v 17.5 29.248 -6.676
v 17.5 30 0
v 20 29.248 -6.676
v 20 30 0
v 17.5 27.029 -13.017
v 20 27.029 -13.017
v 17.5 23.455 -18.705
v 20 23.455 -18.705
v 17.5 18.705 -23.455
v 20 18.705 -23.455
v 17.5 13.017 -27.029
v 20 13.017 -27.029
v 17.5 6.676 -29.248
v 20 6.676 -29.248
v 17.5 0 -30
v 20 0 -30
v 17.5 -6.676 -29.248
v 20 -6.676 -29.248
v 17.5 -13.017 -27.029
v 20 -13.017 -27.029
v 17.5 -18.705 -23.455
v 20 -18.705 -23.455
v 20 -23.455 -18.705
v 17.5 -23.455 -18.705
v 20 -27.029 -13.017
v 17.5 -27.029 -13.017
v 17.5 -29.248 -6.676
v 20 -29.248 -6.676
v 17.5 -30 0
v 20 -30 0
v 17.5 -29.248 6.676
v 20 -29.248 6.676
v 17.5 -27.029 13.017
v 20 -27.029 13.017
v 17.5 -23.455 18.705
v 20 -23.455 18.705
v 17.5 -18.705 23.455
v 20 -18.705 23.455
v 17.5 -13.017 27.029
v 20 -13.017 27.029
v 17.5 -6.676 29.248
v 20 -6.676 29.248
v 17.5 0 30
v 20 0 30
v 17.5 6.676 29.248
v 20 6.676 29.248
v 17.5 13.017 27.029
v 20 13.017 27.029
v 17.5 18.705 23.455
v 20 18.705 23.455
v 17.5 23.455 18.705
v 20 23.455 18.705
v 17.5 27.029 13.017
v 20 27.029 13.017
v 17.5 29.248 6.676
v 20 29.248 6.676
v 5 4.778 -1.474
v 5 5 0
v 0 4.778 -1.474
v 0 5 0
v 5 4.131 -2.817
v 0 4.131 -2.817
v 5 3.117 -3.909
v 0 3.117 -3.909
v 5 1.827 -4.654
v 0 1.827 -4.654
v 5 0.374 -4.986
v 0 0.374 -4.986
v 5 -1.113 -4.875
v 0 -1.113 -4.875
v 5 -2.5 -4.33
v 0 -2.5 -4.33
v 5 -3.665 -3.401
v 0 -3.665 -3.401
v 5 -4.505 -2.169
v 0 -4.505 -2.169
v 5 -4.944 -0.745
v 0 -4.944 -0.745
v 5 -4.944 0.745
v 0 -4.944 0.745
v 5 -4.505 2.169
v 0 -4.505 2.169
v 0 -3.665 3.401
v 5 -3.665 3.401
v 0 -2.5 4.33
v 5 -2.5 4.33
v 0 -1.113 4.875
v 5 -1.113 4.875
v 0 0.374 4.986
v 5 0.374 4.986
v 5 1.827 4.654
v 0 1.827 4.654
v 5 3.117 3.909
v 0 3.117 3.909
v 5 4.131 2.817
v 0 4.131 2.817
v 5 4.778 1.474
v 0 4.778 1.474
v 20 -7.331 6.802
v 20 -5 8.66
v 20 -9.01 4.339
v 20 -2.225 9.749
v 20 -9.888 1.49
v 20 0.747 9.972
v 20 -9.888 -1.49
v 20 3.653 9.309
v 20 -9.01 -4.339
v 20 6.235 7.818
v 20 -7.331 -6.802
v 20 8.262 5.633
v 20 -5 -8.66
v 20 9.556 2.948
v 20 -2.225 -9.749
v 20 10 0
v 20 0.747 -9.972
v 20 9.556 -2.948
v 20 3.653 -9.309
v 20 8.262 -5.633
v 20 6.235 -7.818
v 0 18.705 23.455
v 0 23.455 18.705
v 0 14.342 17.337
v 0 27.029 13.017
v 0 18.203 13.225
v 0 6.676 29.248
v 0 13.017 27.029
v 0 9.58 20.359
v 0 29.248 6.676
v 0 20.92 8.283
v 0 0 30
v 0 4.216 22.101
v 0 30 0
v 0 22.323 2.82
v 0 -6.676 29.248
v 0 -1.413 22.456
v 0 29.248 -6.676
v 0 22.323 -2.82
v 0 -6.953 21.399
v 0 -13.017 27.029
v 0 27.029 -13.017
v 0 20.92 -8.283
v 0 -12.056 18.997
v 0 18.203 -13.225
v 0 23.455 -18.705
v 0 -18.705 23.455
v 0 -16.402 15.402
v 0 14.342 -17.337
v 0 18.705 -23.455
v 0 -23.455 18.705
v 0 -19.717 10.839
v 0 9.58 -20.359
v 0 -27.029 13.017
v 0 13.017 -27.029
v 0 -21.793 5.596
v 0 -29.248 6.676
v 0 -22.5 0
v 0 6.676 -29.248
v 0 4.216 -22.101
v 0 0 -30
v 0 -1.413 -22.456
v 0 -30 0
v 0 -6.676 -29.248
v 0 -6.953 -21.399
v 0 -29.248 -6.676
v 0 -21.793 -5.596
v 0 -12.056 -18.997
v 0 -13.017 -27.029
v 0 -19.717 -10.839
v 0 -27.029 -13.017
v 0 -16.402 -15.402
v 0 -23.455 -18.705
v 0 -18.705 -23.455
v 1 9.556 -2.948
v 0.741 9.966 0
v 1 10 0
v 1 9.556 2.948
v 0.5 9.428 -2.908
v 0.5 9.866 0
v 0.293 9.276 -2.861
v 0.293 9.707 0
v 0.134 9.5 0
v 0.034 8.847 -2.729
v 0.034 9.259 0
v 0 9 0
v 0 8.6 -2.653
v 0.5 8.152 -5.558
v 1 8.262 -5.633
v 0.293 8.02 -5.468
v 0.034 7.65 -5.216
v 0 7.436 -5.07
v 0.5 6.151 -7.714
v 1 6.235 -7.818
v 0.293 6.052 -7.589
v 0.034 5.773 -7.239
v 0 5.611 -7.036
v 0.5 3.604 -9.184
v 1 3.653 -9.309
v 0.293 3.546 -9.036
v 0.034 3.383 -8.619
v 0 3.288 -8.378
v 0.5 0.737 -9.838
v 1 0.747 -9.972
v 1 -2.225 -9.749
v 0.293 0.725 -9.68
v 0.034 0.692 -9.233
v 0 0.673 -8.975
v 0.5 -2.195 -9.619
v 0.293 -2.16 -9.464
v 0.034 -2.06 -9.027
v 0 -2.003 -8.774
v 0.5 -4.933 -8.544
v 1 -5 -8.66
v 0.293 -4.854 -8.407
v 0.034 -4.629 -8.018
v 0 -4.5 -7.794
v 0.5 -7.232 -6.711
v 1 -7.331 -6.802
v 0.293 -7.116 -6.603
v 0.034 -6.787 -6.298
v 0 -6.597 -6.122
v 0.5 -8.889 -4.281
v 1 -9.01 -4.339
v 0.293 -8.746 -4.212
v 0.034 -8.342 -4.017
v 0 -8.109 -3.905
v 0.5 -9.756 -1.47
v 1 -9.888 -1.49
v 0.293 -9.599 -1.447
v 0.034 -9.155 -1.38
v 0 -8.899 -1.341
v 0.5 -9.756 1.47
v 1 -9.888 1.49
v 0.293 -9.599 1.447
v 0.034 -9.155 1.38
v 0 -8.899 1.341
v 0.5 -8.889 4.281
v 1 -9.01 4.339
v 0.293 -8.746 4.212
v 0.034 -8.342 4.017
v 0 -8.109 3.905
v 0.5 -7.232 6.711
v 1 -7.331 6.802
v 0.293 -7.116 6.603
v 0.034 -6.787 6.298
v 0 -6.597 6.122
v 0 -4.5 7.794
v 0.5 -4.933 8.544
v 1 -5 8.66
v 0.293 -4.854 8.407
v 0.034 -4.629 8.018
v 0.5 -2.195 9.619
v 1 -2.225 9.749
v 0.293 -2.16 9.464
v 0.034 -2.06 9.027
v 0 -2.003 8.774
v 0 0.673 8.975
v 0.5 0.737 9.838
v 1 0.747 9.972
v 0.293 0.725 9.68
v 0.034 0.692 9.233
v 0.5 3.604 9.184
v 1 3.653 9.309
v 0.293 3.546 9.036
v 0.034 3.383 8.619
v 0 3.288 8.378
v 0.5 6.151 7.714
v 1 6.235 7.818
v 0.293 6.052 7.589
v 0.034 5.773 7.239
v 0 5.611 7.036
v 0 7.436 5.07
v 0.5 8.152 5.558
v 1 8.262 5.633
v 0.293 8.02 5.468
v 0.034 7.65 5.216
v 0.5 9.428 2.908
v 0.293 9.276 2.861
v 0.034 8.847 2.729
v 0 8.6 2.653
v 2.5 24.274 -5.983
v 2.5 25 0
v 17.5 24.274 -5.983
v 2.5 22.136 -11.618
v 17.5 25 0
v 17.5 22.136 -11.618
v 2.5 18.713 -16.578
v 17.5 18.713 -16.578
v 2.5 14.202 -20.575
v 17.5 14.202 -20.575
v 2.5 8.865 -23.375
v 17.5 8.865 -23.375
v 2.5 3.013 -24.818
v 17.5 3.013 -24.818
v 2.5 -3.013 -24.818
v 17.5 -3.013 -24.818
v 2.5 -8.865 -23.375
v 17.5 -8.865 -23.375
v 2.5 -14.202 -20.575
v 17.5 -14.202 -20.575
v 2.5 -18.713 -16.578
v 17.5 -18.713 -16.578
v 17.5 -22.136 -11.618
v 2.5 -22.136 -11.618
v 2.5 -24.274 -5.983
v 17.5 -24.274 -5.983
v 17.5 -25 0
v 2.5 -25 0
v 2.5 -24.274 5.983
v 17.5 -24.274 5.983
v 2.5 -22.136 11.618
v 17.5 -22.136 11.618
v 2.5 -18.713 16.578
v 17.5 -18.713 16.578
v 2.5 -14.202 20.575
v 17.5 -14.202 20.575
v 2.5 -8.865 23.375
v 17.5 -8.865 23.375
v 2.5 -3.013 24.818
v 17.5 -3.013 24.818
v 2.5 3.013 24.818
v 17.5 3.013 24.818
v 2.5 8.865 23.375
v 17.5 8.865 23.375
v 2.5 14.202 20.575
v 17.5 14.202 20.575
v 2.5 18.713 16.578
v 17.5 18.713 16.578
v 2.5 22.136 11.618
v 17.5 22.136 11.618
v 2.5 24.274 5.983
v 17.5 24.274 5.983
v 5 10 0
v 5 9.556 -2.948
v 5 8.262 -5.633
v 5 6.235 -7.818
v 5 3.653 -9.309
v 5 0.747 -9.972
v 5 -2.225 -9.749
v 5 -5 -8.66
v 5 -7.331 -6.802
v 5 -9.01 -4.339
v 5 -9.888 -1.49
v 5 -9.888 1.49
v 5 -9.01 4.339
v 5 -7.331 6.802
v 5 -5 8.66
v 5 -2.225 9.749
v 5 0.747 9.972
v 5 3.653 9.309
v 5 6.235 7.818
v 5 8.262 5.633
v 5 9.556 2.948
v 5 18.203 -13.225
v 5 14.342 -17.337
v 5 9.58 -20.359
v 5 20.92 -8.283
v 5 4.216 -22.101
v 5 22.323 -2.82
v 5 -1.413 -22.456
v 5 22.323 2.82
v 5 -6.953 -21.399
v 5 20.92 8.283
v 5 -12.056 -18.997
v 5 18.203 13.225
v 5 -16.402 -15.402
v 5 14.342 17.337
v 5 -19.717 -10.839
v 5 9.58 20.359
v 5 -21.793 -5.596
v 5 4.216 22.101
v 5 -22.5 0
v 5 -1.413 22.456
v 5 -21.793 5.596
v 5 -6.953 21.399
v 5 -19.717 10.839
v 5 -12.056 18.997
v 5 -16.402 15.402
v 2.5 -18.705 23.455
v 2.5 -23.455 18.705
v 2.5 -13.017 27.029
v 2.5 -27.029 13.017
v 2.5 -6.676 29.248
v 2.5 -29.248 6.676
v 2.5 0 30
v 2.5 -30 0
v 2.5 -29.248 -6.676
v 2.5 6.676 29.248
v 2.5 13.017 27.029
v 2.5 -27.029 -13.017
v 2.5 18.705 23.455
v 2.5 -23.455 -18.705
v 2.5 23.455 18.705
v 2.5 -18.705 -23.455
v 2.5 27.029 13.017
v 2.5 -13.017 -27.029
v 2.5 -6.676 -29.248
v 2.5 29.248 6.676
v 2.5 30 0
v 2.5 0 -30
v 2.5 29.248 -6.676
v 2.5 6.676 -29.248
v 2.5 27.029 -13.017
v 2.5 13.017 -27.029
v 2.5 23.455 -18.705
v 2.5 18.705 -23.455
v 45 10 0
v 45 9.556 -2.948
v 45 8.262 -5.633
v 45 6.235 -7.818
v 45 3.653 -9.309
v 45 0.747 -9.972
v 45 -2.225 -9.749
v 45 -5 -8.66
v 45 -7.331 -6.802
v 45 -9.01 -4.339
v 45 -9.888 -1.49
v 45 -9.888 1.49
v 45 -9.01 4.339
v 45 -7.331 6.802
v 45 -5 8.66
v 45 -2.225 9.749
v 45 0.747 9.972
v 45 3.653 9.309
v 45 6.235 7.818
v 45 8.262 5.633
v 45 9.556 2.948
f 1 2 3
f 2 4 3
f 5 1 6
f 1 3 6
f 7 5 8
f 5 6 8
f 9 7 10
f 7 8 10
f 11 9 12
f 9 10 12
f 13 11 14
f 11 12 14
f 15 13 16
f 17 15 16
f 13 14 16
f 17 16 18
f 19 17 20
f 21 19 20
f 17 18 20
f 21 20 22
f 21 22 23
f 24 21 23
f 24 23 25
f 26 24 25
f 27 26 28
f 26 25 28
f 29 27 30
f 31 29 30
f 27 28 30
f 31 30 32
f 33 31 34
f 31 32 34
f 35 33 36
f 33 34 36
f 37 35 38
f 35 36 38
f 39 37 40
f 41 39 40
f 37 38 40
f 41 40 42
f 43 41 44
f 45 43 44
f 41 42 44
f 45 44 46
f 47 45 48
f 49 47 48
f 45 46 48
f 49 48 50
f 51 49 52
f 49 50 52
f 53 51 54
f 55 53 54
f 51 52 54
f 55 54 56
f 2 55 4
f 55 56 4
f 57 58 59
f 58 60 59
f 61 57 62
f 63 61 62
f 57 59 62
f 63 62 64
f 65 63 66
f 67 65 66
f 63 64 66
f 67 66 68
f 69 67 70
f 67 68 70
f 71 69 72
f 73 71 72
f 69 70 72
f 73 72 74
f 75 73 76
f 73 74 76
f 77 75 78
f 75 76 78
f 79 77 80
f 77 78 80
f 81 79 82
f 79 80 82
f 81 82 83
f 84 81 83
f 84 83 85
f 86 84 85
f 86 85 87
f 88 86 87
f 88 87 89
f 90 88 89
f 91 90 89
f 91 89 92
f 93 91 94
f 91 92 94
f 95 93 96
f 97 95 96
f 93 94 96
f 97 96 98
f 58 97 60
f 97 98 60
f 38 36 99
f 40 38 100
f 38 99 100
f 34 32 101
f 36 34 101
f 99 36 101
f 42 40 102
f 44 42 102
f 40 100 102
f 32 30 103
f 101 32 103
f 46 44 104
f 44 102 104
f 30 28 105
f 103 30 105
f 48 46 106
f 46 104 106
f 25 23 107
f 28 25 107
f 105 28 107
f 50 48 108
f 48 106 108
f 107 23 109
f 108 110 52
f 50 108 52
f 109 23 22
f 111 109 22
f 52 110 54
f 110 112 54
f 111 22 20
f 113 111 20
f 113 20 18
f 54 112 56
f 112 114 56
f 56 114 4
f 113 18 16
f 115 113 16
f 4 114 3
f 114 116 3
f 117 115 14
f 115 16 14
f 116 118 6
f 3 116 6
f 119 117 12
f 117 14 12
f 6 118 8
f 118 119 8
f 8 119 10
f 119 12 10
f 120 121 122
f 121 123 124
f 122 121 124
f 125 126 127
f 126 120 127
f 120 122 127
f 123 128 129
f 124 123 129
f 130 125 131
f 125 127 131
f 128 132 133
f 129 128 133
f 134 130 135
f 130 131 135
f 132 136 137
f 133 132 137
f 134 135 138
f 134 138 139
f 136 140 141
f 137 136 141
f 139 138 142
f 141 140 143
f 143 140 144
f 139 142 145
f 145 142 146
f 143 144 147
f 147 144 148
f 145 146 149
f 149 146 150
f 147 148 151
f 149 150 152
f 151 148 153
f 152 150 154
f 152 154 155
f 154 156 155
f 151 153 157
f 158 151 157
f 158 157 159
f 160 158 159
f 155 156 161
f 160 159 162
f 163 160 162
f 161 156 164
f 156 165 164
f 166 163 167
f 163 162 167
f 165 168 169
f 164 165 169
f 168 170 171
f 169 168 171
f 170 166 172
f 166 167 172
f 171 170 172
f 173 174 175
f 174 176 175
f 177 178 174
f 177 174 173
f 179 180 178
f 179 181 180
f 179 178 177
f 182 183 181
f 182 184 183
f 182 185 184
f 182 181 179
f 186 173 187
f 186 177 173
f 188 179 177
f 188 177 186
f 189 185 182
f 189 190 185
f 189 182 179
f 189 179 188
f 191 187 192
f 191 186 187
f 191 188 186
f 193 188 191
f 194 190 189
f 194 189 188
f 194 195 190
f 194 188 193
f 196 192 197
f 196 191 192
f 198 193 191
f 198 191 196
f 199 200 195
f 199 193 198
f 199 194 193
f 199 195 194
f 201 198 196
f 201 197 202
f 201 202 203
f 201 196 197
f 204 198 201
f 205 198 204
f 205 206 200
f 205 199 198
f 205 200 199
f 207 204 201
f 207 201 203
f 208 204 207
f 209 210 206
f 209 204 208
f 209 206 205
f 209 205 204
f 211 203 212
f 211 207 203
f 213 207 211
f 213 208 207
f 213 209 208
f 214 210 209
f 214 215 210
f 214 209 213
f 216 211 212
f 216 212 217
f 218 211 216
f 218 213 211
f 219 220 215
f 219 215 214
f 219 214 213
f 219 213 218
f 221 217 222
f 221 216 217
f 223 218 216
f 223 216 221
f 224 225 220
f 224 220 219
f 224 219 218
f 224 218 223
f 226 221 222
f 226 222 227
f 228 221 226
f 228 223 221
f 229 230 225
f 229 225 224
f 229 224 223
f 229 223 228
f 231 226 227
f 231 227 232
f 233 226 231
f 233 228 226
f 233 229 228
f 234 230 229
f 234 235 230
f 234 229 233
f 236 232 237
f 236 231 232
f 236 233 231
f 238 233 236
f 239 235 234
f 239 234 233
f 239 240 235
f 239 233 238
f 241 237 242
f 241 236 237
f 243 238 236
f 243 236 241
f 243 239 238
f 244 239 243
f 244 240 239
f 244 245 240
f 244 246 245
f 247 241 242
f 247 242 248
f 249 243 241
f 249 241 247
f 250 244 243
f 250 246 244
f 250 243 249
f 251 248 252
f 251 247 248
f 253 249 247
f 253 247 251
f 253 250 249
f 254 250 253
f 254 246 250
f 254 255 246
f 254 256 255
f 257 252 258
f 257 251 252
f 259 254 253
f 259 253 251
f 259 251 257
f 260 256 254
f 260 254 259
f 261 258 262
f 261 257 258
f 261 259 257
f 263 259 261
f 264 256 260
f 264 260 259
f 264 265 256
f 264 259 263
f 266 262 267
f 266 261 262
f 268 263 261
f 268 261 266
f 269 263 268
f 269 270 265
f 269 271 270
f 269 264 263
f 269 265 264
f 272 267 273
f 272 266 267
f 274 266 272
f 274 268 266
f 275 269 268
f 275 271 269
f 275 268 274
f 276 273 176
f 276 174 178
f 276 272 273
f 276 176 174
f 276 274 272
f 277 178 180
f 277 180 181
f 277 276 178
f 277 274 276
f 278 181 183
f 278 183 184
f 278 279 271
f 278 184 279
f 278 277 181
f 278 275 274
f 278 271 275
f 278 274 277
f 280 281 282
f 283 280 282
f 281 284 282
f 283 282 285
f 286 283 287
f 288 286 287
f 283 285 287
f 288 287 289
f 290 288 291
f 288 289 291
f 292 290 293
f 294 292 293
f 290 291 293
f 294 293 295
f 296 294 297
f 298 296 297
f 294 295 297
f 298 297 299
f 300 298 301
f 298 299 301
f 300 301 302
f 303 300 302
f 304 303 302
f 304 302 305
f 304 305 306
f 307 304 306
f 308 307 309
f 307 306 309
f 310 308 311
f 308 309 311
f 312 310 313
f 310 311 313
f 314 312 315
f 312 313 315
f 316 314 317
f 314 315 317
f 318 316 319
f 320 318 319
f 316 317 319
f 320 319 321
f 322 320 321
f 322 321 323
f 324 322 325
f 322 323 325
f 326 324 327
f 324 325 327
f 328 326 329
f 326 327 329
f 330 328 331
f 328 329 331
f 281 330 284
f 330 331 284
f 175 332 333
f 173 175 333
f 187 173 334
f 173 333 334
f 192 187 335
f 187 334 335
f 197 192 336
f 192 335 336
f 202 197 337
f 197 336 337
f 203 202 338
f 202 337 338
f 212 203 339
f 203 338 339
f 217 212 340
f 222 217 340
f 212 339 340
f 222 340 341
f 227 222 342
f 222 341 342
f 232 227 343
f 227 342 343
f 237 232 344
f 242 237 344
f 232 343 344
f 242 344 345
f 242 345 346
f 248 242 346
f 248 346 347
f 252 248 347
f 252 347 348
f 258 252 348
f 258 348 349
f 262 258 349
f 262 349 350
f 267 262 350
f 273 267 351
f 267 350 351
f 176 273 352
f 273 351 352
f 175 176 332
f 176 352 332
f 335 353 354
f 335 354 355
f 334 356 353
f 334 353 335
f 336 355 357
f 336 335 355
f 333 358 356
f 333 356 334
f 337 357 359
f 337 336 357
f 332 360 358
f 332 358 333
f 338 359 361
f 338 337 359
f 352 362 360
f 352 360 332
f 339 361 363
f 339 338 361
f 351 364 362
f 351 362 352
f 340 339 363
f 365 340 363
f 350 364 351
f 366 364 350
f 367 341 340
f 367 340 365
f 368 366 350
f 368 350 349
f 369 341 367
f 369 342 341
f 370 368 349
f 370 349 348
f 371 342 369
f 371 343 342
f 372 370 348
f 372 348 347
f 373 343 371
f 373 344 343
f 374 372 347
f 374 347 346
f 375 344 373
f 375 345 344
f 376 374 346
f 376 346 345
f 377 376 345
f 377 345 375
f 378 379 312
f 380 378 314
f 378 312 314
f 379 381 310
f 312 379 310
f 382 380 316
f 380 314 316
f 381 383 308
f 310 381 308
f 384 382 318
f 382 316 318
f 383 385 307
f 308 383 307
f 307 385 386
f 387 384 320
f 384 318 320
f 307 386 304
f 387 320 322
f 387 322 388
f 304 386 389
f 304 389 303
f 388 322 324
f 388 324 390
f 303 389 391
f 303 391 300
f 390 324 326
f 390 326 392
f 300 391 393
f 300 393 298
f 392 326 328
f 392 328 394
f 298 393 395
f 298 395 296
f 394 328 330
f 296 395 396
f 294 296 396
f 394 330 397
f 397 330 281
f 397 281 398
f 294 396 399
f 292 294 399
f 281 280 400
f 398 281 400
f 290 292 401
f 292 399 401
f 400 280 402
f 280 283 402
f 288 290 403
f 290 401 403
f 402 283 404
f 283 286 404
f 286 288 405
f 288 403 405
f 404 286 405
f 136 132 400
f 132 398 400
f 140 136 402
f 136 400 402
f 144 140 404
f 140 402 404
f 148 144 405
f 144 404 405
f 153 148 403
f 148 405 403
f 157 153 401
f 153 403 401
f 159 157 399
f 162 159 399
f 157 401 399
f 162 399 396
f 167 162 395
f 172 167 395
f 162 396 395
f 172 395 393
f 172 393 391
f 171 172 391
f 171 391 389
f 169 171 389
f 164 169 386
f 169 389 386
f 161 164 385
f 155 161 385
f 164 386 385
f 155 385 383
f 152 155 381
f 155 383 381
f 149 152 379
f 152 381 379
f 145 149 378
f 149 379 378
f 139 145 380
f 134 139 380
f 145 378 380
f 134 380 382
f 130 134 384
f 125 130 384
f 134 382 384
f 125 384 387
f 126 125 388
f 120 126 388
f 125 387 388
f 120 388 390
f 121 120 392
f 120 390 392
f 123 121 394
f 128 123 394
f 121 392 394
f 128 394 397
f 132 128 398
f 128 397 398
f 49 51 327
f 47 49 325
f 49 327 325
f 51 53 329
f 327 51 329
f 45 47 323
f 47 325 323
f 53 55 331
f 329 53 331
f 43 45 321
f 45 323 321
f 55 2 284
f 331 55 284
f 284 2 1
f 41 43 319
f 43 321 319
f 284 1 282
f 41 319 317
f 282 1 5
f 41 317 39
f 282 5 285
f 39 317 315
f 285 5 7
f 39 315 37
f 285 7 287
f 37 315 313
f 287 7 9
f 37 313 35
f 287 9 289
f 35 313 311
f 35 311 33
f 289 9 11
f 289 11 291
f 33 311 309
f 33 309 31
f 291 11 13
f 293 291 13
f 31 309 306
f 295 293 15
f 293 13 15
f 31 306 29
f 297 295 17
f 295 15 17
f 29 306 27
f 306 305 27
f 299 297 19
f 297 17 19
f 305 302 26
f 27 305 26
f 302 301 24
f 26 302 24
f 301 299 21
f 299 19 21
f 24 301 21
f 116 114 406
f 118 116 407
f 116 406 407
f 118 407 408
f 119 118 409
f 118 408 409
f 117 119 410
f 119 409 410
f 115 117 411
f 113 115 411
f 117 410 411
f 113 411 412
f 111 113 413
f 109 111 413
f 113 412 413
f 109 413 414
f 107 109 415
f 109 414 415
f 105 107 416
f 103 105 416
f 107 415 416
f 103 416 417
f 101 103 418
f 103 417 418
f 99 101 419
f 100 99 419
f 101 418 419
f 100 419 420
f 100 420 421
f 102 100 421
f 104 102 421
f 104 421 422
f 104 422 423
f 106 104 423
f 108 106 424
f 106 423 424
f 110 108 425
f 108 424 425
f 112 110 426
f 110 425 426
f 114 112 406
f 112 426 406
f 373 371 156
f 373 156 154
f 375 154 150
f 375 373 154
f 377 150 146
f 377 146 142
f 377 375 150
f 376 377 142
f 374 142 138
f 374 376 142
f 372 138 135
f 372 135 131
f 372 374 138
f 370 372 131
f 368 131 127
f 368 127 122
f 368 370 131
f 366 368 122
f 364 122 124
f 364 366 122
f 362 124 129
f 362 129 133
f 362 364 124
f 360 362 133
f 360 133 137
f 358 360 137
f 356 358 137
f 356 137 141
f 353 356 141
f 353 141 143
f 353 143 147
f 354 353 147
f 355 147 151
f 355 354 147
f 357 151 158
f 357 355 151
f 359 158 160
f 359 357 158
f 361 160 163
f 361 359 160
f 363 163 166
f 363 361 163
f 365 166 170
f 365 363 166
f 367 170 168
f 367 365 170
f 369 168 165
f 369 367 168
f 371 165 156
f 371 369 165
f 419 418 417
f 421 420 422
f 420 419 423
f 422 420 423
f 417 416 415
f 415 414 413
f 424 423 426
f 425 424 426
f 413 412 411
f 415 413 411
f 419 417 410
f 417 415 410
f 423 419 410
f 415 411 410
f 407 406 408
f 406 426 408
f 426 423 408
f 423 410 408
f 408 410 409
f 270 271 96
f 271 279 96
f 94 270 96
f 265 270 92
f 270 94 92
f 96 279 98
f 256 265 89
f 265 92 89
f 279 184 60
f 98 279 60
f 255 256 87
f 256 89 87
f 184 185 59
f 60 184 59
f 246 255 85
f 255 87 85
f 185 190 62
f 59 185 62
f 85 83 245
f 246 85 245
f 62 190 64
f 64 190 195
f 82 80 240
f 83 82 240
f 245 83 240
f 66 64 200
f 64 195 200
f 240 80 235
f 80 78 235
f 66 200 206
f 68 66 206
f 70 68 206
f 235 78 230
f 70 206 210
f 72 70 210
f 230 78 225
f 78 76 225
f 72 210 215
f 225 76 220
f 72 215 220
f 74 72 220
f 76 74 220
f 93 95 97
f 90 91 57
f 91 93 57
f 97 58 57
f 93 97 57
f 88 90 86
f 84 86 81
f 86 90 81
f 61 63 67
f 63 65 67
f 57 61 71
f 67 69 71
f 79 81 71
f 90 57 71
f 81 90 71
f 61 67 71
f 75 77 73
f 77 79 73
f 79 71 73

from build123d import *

# Parameters (mm, degrees)
CUT_EXTRUDE1_START = -5
SKETCH2_R          = 22.5
SKETCH2_R_2        = 10
CUT_EXTRUDE1_DEPTH = 5
FILLET1_R          = 1


with BuildPart() as part:
    # Sketch1 → Revolve1 (revolve)
    with BuildSketch(Plane.XY):
        Polygon((0, 5), (0, 30), (2.5, 30), (2.5, 25), (17.5, 25), (17.5, 30), (20, 30), (20, 10), (45, 10), (45, 0), (5, 0), (5, 5), align=None)
    revolve(axis=Axis((45, 0, 0), (-1, 0, 0)))

    # Sketch2 → Cut-Extrude1 (cut)
    with BuildSketch(Plane.ZY.offset(CUT_EXTRUDE1_START)):
        with Locations(Location((0, 0, 0), (0, 0, 270))):
            Circle(SKETCH2_R)
        with Locations(Location((0, 0, 0), (0, 0, 90))):
            Circle(SKETCH2_R_2, mode=Mode.SUBTRACT)
    extrude(amount=CUT_EXTRUDE1_DEPTH, mode=Mode.SUBTRACT)

    # Fillet1
    fillet1_edges = [part.edges().sort_by_distance(p)[0] for p in [
        (0, -10, 0),
    ]]
    fillet(fillet1_edges, radius=FILLET1_R)


solid = part.part
